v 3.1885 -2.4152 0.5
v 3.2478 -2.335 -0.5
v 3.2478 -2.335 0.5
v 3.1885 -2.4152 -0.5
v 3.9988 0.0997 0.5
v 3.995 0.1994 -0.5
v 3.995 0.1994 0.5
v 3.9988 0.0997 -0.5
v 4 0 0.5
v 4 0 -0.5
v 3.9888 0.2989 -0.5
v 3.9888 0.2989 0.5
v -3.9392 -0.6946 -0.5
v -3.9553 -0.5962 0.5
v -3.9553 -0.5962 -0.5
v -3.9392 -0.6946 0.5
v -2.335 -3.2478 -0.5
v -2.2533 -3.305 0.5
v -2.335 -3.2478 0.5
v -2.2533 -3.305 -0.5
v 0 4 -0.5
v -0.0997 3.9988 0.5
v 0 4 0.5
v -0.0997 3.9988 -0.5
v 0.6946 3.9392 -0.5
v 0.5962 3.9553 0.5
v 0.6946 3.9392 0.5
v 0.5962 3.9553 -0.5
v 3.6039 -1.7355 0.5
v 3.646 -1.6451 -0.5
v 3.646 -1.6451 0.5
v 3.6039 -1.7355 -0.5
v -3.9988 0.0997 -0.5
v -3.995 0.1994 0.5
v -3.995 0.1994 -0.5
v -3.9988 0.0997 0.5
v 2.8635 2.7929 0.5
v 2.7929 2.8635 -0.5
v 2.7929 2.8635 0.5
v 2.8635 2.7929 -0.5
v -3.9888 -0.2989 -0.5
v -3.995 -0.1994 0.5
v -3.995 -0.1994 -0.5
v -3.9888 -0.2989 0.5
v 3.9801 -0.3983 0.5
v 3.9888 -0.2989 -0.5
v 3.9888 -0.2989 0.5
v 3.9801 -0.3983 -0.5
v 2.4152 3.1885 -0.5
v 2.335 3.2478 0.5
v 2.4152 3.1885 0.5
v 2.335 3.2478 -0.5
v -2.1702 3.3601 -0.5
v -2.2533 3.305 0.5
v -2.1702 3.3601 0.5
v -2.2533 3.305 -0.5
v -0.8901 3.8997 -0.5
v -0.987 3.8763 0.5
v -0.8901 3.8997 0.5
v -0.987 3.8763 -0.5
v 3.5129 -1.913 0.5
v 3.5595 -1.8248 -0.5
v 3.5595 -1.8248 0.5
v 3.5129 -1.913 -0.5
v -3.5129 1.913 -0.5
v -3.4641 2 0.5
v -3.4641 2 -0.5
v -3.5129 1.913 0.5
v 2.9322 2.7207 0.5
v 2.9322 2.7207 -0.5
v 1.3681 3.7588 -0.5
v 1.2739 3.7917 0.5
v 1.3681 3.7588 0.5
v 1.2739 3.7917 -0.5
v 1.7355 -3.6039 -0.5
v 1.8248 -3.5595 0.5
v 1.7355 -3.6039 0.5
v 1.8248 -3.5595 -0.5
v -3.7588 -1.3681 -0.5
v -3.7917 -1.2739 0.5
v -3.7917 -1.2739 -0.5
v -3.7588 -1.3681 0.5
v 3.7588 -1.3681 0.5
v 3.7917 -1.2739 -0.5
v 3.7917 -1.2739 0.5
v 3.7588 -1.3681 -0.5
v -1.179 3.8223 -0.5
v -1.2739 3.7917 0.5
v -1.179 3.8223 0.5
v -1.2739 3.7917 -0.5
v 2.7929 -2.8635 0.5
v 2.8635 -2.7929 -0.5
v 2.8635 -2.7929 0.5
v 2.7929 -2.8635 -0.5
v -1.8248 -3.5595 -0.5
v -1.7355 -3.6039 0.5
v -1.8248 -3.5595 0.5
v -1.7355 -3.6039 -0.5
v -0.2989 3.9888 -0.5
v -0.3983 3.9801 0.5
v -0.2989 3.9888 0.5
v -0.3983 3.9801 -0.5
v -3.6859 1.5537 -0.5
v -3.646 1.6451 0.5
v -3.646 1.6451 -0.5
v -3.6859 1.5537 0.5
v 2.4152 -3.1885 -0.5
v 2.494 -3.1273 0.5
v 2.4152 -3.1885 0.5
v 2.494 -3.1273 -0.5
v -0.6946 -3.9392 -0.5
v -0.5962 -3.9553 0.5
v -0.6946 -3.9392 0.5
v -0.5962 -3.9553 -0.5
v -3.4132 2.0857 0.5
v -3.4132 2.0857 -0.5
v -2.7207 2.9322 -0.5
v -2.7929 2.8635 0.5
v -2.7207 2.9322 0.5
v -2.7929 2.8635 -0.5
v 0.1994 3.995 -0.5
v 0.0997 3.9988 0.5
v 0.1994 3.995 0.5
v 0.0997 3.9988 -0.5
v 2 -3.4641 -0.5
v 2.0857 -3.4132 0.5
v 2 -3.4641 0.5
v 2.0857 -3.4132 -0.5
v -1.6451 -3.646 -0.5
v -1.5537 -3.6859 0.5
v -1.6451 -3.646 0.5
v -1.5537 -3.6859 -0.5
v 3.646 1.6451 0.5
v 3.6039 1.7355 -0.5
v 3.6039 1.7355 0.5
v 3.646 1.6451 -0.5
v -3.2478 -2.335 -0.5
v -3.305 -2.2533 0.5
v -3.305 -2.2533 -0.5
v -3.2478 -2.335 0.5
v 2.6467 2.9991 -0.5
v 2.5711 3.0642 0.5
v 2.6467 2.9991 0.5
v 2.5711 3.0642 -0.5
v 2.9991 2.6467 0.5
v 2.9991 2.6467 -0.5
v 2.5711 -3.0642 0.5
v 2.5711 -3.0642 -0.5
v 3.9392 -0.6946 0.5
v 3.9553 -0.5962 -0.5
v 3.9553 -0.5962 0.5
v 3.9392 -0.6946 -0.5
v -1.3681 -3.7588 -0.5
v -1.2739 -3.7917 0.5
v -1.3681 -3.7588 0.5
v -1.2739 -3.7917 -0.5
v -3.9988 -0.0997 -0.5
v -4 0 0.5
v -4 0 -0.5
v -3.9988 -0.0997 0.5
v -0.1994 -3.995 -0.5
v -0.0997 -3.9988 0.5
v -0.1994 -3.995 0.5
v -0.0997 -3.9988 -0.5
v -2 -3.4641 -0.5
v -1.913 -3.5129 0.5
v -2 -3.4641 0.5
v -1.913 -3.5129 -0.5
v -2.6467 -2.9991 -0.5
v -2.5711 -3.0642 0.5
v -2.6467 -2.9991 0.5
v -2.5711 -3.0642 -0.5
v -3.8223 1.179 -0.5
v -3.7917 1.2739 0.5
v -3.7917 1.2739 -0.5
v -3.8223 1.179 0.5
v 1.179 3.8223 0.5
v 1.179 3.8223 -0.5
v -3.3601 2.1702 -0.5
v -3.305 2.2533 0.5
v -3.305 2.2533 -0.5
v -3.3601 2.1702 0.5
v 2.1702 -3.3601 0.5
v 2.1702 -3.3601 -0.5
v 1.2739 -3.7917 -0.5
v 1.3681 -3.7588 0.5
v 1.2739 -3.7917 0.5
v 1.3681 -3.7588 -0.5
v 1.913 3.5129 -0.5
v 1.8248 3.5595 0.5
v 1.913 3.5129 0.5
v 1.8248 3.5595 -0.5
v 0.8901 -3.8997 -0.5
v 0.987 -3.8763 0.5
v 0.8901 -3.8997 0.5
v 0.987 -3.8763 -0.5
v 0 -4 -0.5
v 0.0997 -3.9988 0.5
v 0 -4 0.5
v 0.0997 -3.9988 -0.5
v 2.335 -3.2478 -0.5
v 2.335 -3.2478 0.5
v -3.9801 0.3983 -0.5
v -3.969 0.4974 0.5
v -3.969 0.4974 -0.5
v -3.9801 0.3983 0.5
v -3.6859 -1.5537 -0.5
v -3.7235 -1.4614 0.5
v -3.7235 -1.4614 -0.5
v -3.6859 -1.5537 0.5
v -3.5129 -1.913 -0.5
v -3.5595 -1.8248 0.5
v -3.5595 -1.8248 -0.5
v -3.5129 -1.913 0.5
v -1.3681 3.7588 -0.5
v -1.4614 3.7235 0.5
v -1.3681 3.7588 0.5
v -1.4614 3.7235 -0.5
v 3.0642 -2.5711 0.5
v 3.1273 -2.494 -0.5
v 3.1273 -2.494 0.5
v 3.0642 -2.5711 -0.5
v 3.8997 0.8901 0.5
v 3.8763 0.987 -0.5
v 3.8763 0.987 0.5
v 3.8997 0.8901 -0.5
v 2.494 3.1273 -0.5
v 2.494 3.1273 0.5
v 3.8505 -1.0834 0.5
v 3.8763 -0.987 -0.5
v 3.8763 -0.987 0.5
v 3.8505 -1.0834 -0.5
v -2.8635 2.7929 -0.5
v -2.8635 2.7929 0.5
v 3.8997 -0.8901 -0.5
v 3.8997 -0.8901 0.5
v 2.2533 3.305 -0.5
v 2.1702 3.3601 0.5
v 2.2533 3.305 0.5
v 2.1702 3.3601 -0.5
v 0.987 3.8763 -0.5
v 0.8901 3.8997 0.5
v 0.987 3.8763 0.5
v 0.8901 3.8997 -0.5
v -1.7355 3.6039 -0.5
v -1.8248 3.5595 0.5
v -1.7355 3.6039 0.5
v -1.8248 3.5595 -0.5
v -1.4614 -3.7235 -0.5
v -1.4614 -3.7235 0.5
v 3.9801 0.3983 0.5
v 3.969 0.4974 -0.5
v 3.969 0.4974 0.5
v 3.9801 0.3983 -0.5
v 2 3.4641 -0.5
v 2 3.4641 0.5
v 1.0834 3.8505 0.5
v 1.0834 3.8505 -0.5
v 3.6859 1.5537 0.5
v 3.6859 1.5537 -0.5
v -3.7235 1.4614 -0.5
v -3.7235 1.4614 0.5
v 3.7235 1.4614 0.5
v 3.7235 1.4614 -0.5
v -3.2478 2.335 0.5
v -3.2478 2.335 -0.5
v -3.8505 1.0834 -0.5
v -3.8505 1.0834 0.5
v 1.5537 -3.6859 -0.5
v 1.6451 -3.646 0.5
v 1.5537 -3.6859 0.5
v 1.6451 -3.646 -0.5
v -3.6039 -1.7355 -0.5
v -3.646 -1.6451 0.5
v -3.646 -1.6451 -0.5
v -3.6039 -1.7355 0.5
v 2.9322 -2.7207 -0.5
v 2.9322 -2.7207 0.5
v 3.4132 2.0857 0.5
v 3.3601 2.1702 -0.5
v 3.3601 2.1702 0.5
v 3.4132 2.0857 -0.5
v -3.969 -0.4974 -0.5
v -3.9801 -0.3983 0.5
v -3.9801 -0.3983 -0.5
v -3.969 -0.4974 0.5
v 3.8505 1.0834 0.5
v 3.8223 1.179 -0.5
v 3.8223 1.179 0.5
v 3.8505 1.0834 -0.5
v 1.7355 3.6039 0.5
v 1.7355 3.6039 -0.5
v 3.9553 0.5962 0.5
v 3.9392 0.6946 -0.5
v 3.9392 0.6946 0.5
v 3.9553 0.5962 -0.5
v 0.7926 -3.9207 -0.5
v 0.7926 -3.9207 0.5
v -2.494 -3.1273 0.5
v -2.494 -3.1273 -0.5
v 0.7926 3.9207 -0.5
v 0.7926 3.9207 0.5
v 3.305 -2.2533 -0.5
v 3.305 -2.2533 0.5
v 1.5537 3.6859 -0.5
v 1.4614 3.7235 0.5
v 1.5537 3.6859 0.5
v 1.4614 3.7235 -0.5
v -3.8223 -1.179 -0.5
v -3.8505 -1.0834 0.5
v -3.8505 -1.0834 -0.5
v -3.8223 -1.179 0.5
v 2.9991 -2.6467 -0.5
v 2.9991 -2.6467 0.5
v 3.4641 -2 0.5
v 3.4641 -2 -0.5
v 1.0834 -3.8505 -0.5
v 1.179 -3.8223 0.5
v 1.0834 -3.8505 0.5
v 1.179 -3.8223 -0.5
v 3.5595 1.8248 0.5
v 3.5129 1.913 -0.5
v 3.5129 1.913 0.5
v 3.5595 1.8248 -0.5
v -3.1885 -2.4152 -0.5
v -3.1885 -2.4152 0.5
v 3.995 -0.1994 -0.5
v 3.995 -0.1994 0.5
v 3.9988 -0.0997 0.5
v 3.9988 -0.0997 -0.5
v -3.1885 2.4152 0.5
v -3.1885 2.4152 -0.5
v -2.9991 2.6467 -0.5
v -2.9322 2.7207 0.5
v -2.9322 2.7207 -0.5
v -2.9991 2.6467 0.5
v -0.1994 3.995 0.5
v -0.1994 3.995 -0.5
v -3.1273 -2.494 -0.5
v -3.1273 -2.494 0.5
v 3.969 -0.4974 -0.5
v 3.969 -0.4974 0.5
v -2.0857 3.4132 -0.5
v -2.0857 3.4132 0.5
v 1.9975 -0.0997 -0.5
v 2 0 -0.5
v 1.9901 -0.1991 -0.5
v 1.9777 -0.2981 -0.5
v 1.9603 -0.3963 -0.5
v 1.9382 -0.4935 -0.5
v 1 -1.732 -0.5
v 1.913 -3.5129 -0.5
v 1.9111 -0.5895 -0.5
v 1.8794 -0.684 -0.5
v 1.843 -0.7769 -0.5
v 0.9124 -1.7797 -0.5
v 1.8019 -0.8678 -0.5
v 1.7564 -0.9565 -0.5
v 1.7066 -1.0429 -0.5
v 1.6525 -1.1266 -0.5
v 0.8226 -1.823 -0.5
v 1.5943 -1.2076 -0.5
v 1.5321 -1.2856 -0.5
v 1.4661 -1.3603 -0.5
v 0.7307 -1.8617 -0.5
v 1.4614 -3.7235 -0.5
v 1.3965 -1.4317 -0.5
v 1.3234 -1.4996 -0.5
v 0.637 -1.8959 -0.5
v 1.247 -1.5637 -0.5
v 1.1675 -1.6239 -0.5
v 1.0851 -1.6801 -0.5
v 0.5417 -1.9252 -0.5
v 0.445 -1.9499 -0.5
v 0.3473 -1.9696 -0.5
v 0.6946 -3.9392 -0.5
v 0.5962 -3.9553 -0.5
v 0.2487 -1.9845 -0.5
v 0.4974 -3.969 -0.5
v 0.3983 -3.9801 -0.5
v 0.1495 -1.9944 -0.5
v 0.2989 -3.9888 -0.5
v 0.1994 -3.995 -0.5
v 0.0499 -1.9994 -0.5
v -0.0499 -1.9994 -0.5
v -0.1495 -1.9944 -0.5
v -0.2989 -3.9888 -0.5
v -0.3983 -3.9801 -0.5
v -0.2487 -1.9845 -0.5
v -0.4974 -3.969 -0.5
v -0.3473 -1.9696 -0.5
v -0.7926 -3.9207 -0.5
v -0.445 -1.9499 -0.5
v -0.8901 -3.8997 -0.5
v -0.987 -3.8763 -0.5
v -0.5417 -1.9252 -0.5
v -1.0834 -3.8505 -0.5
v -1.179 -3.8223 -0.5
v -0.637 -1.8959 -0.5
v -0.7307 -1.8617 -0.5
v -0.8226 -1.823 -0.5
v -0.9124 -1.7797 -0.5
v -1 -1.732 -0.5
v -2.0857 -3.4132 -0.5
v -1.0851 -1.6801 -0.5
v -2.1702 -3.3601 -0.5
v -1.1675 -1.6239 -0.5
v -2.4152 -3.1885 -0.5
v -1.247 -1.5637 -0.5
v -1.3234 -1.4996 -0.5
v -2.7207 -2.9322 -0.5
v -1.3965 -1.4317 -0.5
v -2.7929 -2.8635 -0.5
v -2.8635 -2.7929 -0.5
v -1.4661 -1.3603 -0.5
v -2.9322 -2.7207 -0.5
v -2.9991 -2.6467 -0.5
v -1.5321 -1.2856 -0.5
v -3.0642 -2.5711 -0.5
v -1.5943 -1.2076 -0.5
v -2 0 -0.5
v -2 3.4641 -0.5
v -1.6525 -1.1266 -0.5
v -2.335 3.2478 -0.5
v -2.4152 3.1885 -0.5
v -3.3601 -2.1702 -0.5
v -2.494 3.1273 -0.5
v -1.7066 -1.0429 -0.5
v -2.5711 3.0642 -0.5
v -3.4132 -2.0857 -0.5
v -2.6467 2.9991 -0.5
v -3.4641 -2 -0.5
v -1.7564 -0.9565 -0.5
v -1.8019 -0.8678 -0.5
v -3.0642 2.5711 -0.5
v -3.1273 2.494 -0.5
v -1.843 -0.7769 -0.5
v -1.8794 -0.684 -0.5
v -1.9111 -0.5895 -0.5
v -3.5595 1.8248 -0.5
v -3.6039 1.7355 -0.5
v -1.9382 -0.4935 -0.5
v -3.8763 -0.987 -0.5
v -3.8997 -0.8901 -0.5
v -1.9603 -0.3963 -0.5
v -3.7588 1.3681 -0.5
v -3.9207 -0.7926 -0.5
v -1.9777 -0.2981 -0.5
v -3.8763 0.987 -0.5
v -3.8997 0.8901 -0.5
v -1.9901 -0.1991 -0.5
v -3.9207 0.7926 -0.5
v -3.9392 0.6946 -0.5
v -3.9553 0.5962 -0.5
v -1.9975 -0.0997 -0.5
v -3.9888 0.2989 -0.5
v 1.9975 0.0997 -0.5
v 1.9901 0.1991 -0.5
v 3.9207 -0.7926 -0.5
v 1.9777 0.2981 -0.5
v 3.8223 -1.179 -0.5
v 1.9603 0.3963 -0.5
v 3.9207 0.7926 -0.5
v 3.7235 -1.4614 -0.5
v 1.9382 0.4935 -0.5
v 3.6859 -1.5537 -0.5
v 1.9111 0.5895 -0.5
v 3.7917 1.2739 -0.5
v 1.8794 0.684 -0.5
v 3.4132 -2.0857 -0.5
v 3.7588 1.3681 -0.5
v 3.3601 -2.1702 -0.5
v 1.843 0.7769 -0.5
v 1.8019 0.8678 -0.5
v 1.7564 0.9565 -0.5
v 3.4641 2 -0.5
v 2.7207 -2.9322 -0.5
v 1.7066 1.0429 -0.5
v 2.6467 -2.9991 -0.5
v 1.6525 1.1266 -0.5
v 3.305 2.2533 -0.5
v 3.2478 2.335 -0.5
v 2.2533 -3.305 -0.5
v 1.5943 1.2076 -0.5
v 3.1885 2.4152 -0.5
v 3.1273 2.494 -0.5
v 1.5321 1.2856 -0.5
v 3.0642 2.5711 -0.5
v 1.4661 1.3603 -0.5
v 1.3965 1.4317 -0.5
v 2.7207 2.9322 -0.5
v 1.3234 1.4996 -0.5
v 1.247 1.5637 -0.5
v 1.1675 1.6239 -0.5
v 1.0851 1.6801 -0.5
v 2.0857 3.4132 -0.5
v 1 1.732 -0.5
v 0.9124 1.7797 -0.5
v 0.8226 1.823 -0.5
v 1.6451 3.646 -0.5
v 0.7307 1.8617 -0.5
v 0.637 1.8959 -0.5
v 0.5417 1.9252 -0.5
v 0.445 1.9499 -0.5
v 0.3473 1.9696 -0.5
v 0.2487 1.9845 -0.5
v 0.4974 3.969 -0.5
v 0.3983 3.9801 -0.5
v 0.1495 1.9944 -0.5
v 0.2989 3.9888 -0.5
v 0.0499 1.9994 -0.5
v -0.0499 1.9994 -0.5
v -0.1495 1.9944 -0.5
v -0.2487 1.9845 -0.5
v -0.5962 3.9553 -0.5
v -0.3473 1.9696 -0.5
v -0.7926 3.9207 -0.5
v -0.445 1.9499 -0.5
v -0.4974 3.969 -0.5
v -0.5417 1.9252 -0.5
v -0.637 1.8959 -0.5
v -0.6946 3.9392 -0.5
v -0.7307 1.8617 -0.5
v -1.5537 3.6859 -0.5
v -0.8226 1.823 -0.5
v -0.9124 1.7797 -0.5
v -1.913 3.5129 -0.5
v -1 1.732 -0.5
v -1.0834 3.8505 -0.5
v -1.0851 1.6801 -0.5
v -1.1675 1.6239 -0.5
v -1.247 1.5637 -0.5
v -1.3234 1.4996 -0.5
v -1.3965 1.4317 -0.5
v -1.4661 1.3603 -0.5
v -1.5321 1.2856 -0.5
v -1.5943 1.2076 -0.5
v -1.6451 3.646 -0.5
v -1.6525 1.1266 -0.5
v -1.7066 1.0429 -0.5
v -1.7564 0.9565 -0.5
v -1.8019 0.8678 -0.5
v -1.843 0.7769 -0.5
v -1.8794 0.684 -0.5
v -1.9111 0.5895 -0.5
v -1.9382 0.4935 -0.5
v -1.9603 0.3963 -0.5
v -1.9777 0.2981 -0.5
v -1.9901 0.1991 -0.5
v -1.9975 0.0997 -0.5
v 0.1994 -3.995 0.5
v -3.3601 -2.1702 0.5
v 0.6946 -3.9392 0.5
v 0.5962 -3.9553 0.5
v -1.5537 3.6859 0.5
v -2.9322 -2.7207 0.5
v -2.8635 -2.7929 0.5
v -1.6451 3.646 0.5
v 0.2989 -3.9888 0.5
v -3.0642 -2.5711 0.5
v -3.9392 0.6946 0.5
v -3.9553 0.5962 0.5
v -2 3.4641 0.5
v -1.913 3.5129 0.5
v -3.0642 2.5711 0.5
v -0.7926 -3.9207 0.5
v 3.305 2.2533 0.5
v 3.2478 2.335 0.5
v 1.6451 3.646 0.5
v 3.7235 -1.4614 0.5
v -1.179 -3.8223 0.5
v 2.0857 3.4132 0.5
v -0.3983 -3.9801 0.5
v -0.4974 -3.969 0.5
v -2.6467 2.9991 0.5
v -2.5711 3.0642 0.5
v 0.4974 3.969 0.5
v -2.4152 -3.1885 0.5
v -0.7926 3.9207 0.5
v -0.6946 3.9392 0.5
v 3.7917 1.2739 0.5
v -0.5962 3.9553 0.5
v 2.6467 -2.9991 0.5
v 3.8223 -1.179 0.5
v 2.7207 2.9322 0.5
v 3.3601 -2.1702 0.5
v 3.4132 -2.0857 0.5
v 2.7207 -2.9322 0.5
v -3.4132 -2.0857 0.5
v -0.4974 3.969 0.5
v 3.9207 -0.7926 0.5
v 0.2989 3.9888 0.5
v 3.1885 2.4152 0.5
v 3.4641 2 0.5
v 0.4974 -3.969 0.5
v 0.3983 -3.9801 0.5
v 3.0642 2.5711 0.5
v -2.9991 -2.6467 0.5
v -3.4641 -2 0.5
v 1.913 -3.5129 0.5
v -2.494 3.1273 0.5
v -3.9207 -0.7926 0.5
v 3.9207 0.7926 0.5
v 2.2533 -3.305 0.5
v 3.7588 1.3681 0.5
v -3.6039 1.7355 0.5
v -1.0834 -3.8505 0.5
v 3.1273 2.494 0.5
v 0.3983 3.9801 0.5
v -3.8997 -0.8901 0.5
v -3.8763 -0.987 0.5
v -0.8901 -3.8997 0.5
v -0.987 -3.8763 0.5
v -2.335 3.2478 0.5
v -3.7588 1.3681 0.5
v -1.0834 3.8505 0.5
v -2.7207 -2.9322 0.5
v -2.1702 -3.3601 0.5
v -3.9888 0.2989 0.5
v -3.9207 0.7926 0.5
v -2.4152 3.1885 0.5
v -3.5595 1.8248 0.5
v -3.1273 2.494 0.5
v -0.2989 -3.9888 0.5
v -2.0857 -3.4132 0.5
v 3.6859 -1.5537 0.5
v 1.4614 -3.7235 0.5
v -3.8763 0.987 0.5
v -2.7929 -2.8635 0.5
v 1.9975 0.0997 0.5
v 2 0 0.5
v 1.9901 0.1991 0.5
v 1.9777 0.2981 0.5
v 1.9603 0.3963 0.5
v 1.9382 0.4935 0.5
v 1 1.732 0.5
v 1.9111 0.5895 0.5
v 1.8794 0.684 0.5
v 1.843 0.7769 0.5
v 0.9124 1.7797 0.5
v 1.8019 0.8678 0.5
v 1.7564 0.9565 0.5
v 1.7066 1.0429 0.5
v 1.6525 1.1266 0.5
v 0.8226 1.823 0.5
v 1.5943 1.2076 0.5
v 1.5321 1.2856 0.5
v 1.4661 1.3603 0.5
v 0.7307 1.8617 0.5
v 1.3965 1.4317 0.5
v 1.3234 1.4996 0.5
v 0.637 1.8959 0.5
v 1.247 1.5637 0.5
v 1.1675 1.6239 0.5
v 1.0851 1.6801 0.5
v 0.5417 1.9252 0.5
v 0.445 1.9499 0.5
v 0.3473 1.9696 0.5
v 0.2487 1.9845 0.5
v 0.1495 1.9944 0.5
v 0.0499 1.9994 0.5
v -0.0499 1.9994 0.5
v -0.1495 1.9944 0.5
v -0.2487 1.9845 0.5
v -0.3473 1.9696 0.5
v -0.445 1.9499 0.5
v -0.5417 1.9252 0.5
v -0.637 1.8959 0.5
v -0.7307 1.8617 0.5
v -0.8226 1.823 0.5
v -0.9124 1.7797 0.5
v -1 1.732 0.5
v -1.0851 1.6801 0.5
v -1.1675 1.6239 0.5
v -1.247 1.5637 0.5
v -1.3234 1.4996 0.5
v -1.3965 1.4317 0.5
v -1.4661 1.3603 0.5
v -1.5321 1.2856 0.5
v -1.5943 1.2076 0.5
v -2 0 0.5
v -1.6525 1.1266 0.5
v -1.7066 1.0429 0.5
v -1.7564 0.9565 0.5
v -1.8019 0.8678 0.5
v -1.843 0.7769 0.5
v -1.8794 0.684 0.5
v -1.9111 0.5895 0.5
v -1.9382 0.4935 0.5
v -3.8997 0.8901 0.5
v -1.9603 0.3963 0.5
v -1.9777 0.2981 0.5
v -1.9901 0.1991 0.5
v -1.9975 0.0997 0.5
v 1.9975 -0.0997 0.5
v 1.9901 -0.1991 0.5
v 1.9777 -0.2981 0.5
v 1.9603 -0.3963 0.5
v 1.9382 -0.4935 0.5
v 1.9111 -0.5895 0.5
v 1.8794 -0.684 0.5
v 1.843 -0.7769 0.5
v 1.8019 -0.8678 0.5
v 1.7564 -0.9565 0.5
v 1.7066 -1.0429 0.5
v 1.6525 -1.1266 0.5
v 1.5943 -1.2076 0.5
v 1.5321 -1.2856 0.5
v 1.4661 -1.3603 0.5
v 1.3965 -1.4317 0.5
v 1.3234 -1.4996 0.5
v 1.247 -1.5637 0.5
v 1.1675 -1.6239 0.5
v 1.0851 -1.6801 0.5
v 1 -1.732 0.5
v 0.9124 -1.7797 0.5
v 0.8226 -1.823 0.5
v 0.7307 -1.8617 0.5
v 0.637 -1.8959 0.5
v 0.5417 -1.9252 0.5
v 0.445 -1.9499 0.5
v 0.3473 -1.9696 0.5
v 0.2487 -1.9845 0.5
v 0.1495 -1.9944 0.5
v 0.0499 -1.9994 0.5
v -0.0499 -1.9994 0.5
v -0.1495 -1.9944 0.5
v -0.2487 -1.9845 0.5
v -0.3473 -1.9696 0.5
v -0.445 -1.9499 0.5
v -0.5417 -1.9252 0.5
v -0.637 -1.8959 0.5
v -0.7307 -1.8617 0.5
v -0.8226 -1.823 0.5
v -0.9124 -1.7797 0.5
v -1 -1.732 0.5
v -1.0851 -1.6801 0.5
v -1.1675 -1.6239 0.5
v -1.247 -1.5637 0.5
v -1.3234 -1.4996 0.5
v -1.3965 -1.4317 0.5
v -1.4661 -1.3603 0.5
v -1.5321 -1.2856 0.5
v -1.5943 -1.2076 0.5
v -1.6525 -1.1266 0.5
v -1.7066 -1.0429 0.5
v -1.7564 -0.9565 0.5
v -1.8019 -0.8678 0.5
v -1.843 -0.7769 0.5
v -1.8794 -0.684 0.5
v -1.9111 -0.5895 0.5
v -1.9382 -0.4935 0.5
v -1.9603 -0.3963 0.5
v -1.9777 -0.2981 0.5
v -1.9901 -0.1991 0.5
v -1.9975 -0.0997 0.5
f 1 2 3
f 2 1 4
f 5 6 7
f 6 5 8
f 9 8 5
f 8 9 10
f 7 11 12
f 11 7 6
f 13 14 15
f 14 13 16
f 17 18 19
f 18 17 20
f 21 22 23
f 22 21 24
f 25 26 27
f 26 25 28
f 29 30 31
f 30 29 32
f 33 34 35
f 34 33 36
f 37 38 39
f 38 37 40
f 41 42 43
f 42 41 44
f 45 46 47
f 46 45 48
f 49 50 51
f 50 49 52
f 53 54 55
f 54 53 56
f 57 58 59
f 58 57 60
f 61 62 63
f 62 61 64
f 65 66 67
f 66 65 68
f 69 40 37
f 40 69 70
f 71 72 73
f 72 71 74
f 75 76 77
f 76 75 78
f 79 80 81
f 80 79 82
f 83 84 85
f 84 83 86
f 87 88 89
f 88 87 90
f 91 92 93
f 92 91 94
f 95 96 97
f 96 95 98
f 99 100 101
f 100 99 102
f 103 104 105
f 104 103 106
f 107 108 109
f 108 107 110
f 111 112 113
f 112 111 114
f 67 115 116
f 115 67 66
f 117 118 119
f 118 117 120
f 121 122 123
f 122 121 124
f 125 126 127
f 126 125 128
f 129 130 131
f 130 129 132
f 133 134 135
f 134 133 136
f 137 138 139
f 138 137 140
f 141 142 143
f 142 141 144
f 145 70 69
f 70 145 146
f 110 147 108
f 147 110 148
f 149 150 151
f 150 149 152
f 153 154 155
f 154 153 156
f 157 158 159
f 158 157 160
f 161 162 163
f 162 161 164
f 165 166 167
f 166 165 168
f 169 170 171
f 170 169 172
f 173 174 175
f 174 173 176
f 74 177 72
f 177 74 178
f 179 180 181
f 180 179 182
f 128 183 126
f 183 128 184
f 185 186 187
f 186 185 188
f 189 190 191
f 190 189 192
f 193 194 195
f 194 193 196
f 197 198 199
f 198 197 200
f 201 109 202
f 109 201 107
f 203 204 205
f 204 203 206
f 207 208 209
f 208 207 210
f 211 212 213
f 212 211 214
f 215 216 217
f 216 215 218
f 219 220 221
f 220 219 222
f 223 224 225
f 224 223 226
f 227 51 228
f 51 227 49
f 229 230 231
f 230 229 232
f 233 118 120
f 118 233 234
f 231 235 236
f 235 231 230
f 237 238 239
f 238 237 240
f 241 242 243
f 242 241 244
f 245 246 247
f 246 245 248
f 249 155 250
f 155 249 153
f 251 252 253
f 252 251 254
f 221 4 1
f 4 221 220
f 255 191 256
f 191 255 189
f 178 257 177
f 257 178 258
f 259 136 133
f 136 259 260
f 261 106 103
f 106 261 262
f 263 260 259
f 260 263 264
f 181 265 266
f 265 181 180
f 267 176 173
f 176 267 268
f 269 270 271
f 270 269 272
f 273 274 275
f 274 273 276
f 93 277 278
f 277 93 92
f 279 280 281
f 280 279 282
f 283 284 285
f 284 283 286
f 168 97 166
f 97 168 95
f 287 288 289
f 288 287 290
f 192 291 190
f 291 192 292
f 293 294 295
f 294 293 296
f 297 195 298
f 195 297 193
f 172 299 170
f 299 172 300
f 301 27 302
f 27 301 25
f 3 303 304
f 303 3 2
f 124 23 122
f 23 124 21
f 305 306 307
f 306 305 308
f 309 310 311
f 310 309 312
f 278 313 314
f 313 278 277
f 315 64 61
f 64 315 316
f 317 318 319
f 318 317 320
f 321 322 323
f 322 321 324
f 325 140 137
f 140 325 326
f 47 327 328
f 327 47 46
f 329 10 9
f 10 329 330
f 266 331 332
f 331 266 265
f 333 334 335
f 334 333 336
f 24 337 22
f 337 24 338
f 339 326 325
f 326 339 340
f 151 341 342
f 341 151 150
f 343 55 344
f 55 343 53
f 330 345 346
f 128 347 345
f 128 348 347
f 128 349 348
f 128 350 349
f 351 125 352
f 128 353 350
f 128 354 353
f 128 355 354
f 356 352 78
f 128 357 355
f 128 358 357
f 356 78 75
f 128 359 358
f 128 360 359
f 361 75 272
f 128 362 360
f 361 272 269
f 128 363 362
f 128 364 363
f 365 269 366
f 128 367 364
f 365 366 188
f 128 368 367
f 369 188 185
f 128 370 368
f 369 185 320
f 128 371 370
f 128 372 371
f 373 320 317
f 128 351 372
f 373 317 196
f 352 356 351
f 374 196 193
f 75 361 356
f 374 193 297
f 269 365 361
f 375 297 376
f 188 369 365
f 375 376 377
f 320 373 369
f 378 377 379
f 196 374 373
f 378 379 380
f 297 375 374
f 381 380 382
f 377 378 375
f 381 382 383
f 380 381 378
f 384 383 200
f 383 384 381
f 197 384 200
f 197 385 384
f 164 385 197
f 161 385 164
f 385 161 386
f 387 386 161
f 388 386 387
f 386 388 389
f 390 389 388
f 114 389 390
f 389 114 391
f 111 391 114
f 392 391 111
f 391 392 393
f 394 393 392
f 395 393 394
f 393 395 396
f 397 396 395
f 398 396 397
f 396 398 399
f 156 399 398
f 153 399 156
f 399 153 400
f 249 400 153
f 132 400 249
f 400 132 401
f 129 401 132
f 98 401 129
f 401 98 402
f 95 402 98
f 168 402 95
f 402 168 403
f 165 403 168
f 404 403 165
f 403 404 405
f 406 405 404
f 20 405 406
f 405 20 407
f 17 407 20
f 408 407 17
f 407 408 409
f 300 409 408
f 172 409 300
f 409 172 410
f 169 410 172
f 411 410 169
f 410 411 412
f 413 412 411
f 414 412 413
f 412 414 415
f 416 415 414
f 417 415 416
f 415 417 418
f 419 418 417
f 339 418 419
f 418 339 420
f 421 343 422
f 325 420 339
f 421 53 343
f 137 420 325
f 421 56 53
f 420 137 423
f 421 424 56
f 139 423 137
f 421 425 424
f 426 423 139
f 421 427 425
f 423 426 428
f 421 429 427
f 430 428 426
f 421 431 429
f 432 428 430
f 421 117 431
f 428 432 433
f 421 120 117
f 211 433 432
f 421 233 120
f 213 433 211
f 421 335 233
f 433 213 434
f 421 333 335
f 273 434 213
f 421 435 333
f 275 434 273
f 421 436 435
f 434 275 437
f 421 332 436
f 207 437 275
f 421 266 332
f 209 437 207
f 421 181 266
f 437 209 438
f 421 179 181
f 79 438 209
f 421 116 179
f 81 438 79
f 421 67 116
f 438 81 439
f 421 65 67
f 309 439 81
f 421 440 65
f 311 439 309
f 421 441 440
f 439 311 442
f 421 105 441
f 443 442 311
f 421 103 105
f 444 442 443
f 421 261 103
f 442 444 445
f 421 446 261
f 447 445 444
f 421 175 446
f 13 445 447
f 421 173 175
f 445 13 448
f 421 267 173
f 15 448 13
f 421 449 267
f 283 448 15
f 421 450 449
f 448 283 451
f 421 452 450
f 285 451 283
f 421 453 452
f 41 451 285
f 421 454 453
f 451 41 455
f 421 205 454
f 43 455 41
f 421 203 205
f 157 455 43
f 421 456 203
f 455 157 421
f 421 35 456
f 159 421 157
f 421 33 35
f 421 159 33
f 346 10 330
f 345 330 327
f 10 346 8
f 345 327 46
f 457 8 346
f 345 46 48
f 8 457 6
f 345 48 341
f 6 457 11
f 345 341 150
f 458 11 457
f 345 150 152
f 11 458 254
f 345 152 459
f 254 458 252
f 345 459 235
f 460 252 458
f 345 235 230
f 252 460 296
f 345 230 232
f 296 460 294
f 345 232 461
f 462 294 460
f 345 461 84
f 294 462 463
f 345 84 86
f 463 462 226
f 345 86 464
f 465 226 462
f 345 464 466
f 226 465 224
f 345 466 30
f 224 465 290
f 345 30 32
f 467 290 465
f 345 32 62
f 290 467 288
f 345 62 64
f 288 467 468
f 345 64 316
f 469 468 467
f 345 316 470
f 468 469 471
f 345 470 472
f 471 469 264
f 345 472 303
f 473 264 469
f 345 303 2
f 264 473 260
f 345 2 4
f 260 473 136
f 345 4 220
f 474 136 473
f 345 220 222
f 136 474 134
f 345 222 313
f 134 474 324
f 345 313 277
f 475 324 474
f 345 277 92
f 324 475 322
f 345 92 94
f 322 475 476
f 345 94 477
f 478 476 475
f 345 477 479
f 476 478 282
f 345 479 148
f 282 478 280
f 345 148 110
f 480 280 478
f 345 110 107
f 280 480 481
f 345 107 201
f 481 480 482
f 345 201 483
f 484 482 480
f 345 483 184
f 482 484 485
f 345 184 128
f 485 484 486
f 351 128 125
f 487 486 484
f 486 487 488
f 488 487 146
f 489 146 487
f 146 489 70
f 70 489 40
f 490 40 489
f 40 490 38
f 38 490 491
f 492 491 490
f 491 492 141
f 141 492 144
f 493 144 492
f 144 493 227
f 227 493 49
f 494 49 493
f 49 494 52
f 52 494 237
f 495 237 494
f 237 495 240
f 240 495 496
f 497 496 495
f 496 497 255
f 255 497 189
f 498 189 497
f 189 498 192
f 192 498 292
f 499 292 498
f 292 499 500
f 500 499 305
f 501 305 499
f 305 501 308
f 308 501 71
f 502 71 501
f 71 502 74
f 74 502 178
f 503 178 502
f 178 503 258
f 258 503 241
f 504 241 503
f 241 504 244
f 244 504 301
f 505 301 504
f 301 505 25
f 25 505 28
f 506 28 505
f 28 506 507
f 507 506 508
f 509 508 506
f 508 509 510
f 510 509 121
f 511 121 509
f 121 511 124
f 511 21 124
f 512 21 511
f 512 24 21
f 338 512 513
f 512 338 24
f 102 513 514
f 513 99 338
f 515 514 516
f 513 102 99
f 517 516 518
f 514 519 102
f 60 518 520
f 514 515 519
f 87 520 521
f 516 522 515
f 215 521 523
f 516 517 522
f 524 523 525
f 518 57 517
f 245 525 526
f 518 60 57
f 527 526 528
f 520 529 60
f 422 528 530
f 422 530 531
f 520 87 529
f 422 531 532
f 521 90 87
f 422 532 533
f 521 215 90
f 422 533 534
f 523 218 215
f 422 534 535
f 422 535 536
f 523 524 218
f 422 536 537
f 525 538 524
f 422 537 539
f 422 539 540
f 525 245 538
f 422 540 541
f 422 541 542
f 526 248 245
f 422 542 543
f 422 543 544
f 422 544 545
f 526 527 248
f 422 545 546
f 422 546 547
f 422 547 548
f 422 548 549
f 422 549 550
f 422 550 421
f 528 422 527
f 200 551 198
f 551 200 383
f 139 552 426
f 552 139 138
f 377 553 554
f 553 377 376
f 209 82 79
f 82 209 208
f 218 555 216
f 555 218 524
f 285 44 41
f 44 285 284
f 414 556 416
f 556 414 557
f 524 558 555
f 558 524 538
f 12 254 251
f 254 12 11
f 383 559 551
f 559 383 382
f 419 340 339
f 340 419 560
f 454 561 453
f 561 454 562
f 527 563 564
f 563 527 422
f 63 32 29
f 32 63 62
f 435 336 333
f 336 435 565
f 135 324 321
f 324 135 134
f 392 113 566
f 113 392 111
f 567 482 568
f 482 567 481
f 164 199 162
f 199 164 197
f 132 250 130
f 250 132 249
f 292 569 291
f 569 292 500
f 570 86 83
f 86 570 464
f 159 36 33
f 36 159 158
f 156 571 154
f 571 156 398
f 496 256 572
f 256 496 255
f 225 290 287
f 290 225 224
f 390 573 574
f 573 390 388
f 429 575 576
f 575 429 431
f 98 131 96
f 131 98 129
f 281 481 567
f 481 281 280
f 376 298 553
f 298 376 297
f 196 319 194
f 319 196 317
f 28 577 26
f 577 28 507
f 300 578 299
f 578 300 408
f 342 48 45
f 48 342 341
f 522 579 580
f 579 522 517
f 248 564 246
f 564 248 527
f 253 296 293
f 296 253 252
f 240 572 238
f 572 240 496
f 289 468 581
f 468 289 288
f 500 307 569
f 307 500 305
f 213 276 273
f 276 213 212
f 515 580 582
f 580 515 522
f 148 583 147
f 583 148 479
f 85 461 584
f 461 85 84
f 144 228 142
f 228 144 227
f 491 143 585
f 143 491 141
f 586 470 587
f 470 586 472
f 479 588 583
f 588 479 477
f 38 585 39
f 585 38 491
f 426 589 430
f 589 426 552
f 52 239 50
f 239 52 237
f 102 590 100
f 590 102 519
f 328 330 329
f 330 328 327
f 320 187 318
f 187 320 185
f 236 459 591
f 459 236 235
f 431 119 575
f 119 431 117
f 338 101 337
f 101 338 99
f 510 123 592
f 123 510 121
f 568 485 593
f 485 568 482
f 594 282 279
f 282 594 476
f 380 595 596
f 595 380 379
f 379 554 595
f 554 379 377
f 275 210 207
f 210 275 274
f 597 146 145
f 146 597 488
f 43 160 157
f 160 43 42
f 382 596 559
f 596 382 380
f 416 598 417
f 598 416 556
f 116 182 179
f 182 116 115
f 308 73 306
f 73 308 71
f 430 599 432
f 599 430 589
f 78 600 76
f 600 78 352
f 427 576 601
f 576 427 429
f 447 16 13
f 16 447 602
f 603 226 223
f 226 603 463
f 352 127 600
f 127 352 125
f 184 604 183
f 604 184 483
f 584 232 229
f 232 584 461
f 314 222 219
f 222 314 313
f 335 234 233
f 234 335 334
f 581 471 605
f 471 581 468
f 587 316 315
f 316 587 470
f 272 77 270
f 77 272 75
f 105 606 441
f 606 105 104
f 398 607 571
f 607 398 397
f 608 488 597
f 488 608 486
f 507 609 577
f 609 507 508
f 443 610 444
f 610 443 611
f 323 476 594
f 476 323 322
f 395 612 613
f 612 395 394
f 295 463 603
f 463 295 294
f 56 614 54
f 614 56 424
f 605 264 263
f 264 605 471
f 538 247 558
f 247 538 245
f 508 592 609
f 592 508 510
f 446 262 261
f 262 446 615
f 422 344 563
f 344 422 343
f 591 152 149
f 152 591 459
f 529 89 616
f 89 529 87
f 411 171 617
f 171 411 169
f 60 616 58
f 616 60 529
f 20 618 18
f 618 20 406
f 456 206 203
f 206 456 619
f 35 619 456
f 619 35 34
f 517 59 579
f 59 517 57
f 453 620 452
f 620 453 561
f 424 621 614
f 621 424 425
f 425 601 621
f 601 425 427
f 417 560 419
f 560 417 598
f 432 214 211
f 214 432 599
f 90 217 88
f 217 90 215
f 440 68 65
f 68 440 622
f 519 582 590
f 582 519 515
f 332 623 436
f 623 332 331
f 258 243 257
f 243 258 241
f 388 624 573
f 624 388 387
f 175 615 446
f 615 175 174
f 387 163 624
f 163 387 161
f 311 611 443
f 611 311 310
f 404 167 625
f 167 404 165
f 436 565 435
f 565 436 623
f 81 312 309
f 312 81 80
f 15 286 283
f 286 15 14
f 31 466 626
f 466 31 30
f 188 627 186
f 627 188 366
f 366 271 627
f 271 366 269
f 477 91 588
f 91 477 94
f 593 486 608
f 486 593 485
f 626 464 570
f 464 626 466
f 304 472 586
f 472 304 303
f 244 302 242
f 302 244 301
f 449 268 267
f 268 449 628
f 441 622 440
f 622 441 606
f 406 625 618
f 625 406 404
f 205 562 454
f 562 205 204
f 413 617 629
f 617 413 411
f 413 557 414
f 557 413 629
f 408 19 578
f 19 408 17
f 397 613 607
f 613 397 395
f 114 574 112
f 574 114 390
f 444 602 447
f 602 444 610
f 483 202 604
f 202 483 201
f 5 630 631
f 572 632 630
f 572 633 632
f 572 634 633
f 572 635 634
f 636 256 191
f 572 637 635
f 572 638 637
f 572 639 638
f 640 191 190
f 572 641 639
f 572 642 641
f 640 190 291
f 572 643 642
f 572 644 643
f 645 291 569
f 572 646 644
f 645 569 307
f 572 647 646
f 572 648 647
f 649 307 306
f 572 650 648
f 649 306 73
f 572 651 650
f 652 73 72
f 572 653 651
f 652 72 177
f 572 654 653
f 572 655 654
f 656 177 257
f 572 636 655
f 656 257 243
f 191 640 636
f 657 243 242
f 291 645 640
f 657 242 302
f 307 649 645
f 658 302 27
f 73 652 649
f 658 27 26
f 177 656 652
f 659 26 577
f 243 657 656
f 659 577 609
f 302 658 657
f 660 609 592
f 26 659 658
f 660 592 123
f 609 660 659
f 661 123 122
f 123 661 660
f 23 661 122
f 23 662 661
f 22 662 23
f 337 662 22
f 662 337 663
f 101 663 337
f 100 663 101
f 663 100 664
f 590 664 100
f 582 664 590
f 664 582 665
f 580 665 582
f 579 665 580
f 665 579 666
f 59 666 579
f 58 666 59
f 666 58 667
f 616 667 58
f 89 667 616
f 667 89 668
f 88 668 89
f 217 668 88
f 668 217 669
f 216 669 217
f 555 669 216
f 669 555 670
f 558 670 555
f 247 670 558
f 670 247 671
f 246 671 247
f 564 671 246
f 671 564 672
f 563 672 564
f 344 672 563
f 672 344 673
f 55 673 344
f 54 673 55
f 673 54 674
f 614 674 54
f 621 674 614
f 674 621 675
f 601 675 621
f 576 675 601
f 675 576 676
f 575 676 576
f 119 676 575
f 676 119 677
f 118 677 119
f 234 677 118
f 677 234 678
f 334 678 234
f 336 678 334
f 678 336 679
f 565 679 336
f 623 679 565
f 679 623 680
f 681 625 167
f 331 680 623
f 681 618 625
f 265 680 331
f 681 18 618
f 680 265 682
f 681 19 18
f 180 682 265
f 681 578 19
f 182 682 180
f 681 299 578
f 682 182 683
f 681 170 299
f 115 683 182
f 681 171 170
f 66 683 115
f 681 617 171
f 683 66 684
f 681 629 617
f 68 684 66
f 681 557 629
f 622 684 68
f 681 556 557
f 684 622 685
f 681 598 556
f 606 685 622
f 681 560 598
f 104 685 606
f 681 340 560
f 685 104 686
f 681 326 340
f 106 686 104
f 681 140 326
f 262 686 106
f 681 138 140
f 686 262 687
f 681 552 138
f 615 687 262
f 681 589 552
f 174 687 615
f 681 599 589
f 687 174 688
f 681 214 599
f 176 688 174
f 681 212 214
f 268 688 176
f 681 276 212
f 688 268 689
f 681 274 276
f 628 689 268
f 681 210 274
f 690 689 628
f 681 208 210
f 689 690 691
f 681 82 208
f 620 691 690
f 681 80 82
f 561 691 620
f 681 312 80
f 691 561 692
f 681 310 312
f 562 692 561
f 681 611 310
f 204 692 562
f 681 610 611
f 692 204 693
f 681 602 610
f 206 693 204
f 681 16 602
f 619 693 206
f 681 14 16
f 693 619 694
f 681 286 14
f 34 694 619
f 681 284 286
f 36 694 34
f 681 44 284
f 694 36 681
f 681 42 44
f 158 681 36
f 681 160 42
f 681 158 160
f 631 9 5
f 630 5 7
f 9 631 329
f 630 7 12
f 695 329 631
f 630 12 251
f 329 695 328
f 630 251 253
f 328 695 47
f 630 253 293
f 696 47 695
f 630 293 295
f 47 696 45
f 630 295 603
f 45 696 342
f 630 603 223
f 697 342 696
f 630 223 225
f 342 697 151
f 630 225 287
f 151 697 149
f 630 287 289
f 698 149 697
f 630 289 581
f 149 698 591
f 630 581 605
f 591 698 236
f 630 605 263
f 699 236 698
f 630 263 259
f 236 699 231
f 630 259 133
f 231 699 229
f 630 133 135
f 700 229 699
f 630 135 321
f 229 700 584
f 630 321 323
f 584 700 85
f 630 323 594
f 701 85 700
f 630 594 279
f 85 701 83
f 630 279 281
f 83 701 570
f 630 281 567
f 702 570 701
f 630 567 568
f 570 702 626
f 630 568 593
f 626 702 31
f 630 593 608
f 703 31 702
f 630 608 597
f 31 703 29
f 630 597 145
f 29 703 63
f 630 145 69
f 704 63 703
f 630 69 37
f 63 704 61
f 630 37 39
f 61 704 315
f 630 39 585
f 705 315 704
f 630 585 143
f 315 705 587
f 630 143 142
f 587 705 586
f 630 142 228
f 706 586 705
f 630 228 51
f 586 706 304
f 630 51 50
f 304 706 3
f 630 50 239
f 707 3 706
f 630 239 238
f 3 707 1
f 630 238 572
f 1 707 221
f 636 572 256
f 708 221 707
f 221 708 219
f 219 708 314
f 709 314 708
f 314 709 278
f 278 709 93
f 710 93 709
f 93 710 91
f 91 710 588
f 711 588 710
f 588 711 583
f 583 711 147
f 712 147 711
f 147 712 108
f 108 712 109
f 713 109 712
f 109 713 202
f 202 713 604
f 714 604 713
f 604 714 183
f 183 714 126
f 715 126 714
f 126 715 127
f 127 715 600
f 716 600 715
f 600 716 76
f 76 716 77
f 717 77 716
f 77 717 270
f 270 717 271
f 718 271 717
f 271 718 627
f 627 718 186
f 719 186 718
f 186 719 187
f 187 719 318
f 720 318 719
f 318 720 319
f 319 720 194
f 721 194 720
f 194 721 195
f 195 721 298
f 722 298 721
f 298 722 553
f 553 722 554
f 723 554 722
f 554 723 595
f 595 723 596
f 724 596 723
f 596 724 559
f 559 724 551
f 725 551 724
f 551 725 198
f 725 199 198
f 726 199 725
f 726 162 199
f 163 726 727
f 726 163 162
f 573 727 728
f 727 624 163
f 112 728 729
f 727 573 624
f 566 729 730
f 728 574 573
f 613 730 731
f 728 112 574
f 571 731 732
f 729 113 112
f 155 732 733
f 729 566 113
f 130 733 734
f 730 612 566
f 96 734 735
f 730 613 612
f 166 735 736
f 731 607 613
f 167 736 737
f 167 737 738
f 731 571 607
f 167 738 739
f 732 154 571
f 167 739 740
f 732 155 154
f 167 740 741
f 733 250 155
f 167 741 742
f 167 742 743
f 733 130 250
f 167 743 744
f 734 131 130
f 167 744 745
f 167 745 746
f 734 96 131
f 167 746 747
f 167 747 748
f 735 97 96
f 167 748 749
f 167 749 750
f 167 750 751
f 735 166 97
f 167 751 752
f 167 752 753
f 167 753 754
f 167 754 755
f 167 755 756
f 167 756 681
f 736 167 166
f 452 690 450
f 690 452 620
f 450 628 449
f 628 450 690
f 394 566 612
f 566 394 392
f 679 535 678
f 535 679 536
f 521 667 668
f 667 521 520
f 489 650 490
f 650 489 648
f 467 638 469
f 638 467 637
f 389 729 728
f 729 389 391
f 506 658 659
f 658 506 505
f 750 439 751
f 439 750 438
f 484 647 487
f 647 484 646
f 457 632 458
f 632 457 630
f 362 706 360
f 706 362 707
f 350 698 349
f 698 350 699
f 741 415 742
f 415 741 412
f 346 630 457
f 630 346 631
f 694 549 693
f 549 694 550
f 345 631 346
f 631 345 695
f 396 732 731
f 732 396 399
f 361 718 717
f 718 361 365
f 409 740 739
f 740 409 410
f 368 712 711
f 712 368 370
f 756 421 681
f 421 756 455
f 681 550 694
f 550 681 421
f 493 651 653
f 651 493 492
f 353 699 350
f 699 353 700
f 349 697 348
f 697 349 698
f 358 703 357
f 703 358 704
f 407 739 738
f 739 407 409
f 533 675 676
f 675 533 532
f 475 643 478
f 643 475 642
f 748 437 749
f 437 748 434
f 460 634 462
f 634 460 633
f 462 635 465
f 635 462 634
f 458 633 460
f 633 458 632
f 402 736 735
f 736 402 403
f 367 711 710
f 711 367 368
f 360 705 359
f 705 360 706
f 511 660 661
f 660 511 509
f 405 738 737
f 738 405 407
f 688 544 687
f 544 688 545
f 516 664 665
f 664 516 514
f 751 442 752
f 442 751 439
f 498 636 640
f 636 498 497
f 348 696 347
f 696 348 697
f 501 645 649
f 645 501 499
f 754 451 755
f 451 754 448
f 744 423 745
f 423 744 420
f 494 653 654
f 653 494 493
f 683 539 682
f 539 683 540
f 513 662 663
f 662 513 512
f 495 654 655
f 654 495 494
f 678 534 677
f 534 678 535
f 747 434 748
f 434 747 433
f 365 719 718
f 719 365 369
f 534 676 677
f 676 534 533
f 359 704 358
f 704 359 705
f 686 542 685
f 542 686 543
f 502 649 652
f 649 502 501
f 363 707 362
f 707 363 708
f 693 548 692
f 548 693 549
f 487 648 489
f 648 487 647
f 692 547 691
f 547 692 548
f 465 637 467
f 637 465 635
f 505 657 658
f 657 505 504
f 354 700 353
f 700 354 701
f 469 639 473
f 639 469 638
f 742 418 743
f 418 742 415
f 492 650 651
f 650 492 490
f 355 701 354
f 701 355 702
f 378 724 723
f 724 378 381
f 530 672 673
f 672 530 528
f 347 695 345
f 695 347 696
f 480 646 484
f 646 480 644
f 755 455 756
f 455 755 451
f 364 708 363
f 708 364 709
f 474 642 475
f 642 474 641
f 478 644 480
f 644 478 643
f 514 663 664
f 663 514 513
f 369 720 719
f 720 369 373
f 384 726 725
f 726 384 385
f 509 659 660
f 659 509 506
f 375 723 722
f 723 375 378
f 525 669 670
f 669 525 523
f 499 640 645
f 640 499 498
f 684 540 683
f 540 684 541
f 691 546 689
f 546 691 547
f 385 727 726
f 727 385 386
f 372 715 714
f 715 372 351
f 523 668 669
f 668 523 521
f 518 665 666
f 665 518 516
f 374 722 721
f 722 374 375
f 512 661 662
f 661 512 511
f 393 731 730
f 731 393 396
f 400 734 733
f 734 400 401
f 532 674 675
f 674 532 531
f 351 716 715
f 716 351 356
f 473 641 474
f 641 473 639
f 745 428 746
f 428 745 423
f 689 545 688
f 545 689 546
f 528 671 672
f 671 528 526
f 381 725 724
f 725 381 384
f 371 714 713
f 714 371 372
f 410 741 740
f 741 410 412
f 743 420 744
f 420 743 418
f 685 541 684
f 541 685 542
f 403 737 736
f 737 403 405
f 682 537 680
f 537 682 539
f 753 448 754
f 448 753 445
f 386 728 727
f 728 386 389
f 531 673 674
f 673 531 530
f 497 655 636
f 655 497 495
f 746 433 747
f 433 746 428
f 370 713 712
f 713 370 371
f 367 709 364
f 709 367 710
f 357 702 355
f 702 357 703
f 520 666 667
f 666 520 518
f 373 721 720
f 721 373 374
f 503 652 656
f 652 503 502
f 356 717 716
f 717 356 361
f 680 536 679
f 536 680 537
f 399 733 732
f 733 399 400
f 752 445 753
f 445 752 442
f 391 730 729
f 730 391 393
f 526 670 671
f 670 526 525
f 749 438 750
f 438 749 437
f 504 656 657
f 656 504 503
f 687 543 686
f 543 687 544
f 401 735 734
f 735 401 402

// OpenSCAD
outer_r = 4.0; // mm
width = 1.0; // mm
inner_r = 2.0; // mm

$fa = 1.0;
$fs = 0.1;

difference()
{
    cylinder(h=width, r=outer_r, center=true);
    cylinder(h=width+1.0, r=inner_r, center=true);
}
